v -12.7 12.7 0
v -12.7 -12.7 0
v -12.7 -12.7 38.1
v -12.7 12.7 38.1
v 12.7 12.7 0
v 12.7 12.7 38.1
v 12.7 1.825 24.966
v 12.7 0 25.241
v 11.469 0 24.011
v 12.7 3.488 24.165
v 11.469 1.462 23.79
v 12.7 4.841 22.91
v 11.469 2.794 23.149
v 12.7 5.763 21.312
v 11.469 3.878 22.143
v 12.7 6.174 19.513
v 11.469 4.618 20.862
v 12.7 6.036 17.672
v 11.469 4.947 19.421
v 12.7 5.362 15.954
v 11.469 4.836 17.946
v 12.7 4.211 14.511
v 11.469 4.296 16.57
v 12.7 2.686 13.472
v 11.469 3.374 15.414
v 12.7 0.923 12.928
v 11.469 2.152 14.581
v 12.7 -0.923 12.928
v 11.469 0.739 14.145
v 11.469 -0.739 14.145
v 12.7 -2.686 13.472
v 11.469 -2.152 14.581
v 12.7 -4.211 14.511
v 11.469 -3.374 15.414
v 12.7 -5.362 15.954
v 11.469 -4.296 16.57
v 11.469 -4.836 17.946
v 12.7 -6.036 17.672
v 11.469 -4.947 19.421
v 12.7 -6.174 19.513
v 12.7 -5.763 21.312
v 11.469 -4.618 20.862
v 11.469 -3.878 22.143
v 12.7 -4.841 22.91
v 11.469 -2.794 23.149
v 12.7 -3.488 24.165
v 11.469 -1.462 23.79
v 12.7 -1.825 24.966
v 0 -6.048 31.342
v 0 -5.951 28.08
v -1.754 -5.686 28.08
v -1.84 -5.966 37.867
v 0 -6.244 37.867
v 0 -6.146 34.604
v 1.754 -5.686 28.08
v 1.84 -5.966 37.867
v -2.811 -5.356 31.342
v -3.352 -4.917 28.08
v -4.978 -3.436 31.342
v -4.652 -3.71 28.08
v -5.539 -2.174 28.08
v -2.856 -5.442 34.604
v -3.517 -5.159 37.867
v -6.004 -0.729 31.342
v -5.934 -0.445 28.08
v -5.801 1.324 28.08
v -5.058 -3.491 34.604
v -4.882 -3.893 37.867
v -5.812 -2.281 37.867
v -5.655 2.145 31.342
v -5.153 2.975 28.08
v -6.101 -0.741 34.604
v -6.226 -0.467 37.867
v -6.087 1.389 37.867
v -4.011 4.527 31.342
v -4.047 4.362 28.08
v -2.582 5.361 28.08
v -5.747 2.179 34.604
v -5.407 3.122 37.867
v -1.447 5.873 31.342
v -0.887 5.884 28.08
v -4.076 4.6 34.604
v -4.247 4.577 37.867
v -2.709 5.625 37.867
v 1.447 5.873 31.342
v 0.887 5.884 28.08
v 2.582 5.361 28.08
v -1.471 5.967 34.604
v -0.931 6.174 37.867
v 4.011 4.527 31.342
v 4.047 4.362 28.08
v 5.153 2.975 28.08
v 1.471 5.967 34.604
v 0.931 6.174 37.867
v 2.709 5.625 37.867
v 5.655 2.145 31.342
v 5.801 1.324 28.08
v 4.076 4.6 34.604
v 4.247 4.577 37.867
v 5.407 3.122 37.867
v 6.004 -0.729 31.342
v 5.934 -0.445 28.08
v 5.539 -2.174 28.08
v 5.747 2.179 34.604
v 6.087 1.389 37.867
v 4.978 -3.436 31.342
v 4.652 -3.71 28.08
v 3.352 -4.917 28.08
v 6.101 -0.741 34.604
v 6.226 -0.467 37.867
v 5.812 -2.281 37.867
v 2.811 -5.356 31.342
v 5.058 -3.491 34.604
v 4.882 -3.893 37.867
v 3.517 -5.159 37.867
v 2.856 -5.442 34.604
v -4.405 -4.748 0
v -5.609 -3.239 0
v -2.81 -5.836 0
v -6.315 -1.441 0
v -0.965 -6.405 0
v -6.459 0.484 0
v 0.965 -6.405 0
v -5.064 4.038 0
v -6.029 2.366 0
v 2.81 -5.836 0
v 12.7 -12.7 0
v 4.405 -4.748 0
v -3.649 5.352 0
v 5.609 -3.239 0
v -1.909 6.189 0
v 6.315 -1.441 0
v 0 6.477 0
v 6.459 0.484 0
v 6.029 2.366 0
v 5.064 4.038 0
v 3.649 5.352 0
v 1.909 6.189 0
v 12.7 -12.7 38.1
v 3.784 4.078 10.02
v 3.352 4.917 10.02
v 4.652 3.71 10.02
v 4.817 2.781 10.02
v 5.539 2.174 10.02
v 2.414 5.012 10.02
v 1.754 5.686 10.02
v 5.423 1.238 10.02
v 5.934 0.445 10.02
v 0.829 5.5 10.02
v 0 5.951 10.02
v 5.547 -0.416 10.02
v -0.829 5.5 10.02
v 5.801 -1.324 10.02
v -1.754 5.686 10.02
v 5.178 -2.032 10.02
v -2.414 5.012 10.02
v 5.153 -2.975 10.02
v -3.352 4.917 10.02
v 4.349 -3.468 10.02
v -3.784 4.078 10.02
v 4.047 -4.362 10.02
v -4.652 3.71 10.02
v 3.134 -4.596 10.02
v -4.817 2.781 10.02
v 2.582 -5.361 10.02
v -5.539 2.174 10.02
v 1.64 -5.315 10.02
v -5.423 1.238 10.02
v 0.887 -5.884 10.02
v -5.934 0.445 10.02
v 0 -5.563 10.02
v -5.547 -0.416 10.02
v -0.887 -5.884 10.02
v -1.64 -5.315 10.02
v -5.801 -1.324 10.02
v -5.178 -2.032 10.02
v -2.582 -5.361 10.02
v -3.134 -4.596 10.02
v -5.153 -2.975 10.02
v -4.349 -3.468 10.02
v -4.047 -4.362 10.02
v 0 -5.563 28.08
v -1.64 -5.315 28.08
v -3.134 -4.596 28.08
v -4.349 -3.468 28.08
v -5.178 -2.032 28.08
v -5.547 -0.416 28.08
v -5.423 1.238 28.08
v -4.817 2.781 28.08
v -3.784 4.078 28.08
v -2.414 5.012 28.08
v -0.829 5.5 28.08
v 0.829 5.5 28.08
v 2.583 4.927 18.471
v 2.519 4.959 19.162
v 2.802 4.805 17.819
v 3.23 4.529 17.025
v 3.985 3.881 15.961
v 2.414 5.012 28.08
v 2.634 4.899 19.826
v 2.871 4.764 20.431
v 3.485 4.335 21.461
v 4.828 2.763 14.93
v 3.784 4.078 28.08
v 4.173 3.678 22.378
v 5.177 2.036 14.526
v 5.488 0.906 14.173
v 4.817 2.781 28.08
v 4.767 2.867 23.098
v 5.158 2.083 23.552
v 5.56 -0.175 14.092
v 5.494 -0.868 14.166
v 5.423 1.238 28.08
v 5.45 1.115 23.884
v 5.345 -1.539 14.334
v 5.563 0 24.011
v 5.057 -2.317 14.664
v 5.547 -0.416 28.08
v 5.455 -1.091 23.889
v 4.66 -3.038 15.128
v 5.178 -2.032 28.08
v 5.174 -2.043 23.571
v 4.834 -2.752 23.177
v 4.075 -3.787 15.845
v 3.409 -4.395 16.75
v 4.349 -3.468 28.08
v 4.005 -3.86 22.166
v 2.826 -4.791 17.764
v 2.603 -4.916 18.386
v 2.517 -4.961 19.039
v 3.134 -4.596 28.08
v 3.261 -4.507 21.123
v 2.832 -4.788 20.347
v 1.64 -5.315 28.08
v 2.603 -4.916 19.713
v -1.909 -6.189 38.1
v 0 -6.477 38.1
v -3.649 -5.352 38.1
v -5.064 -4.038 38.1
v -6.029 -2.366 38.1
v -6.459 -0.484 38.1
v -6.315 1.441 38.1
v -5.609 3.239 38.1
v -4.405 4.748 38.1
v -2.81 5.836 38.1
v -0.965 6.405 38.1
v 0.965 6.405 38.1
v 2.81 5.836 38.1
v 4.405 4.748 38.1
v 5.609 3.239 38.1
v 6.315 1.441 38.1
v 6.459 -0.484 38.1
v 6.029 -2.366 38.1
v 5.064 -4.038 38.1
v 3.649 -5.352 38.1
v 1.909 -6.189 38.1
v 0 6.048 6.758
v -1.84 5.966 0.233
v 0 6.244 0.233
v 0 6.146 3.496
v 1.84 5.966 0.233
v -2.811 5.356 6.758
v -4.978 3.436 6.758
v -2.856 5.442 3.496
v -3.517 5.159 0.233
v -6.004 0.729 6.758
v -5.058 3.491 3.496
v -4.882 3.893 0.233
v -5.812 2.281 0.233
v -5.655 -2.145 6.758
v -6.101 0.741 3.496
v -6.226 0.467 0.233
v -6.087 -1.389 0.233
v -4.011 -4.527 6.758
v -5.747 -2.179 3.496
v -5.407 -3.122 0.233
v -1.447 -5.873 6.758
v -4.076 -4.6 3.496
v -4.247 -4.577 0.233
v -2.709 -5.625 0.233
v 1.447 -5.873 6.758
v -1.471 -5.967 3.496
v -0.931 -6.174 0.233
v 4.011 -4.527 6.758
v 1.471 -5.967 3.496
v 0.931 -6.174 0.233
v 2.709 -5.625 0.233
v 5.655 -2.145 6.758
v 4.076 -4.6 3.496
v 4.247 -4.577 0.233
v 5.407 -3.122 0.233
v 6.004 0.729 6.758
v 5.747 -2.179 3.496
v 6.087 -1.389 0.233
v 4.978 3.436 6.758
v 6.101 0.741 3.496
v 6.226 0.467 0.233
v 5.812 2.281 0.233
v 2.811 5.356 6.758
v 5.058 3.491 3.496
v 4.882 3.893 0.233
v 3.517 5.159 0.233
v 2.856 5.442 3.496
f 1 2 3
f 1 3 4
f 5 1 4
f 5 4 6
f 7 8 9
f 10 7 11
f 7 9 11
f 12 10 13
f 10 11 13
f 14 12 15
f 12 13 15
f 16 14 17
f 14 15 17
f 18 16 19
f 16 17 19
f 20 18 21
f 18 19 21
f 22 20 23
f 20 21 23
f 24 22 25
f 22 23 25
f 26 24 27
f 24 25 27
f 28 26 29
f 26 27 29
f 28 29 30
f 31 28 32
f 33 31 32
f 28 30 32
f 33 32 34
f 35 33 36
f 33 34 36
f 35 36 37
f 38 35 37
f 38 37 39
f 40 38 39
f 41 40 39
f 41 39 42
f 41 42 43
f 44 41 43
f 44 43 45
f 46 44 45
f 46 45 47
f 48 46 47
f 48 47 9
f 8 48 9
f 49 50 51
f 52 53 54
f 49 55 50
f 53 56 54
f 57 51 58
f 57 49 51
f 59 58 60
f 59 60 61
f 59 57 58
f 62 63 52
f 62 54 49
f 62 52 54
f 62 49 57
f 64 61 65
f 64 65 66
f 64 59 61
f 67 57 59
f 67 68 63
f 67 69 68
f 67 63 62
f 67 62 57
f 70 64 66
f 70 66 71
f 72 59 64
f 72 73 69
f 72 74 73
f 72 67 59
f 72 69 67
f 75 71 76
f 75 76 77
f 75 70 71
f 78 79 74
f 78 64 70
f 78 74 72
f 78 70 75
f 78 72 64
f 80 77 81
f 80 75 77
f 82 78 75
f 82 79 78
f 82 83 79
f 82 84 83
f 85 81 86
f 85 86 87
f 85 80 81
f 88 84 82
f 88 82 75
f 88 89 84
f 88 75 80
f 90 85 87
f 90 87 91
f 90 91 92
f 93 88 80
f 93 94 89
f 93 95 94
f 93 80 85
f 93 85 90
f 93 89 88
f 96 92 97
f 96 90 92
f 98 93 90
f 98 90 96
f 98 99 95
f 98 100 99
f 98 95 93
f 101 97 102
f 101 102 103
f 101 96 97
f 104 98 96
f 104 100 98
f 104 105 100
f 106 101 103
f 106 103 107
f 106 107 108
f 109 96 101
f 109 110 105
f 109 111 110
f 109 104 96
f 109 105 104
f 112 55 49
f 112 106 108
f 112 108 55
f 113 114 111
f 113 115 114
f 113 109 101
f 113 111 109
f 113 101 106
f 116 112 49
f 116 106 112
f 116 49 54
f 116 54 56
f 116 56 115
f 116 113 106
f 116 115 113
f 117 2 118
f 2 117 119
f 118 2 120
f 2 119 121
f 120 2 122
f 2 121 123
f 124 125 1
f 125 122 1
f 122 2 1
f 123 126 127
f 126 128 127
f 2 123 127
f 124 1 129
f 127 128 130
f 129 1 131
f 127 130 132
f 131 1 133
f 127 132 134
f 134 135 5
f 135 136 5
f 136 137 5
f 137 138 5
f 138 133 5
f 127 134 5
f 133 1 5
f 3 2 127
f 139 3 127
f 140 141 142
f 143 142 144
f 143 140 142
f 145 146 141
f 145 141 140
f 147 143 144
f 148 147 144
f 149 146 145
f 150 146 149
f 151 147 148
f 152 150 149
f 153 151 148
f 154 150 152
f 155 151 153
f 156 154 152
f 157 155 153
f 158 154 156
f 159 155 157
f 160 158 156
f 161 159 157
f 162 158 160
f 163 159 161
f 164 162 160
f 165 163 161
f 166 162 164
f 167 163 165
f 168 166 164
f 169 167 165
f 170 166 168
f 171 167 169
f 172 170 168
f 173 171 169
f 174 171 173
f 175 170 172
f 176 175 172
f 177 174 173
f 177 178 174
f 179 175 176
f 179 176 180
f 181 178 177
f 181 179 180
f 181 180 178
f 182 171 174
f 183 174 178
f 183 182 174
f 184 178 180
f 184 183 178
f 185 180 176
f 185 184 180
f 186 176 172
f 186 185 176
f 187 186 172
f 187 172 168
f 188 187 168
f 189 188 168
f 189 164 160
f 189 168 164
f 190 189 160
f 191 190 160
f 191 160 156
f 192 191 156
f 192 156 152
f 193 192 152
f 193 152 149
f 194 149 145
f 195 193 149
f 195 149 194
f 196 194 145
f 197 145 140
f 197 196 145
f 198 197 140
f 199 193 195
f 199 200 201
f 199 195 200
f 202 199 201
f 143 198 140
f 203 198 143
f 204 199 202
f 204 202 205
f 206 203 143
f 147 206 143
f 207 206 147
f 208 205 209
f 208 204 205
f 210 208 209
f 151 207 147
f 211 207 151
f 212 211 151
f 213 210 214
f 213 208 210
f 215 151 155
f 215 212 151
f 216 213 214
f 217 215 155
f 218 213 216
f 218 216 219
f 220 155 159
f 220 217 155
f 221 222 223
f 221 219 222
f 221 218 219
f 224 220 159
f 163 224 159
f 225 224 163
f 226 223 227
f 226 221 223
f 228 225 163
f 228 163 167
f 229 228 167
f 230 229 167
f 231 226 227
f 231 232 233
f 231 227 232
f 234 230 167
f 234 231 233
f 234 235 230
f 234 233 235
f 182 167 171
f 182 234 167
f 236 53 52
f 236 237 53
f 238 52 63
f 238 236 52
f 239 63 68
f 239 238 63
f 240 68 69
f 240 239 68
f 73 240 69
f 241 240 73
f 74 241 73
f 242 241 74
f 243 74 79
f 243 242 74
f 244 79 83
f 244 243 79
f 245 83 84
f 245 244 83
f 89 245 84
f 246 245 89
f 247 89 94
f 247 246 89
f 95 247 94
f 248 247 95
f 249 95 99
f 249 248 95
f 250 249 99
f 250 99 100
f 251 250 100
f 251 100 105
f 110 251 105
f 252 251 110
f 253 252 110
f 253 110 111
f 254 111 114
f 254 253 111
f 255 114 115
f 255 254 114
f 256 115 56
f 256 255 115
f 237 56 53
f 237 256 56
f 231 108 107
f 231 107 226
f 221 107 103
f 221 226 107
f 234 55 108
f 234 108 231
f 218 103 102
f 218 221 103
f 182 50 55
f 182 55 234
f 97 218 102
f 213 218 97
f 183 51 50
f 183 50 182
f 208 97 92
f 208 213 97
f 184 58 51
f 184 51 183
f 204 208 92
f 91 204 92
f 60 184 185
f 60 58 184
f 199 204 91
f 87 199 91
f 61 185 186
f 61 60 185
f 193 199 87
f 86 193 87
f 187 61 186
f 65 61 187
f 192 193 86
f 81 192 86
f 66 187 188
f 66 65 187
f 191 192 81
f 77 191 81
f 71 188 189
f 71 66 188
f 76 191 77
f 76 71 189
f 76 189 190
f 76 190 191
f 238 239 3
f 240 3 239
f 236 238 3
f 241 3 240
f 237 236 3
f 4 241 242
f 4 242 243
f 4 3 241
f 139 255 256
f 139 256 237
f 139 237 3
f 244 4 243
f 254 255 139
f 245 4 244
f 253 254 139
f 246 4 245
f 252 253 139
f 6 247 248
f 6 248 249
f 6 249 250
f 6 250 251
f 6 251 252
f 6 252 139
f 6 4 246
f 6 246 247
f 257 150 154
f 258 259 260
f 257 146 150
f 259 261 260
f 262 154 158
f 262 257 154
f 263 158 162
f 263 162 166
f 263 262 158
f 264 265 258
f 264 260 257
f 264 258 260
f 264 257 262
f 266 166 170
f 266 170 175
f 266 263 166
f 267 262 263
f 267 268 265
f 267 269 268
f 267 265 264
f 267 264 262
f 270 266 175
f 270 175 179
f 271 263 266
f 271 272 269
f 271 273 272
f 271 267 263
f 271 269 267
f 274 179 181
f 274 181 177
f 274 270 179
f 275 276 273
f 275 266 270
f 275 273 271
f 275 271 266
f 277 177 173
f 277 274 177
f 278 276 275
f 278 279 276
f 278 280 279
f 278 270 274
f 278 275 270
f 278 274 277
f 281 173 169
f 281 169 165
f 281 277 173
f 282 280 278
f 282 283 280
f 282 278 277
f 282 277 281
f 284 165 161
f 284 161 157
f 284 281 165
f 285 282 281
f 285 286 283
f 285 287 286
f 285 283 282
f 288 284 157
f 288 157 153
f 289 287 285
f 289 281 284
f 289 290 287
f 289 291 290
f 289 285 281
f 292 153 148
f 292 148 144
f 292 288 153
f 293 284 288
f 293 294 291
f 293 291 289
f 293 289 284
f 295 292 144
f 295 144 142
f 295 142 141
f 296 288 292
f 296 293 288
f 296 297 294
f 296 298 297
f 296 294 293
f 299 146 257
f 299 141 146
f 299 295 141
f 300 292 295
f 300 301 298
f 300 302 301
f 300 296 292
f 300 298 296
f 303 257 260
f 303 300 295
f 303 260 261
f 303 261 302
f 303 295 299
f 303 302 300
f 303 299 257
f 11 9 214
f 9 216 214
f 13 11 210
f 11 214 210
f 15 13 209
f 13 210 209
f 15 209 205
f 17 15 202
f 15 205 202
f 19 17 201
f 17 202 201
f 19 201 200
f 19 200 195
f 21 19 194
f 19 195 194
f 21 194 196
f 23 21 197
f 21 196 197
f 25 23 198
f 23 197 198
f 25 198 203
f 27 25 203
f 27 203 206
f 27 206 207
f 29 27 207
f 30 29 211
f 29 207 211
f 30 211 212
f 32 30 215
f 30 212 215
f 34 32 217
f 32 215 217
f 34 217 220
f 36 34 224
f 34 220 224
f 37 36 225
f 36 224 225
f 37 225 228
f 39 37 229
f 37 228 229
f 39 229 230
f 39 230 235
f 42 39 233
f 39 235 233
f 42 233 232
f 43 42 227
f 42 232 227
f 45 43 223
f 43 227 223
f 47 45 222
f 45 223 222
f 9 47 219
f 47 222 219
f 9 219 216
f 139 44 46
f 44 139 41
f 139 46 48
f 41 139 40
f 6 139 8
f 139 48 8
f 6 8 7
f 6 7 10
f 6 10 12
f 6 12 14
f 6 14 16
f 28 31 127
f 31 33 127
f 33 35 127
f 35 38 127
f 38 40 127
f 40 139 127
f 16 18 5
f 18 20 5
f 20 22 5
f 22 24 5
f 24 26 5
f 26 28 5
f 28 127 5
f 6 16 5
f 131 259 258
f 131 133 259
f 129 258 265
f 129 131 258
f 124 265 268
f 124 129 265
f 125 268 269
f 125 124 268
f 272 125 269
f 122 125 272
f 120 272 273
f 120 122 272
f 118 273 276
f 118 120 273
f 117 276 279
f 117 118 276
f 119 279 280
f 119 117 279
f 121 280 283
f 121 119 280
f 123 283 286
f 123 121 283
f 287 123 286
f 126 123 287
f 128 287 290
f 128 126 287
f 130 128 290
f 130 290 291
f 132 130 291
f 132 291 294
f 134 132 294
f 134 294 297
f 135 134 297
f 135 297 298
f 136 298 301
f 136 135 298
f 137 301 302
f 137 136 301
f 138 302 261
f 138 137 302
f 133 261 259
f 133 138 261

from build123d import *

# Parameters (mm, degrees)
SKETCH2_W                          = 25.4
SKETCH2_H                          = 25.4
BOSS_EXTRUDE1_DEPTH                = 38.1
F_7_16_20_TAPPED_HOLE2_D           = 9.92124
F_7_16_20_TAPPED_HOLE2_DEPTH       = 12.7
F_7_16_20_TAPPED_HOLE2_CSINK_D     = 12.3825
F_7_16_20_TAPPED_HOLE2_CSINK_ANGLE = 90
F_7_16_20_TAPPED_HOLE2_TIP         = 2.980641204


with BuildPart() as part:
    # Sketch2 → Boss-Extrude1 (new body)
    with BuildSketch(Plane.XY):
        Rectangle(SKETCH2_W, SKETCH2_H)
    extrude(amount=BOSS_EXTRUDE1_DEPTH)

    # Sketch6 → 1/4 NPT Tapped Hole1 (revolve, cut)
    with BuildSketch(Plane(origin=(0, 0, 38.1), x_dir=(0, -1, 0), z_dir=(1, 0, 0))):
        Polygon((0, 0), (0, 38.1), (5.5626, 38.1), (5.5626, 10.02), (5.950661746, 10.02), (6.2436883, 0.2333117), (6.477, 0), align=None)
    revolve(axis=Axis((0, 0, 44.45), (0, 0, -1)), mode=Mode.SUBTRACT)

    # Sketch8 → 1/4 NPT Tapped Hole2 (revolve, cut)
    with BuildSketch(Plane.YZ):
        Polygon((0, 0), (0, 38.1), (5.5626, 38.1), (5.5626, 10.02), (5.950661746, 10.02), (6.2436883, 0.2333117), (6.477, 0), align=None)
    revolve(axis=Axis((0, 0, -6.35), (0, 0, 1)), mode=Mode.SUBTRACT)

    # 7/16-20 Tapped Hole2
    with Locations(Plane(origin=(12.7, 0, 0), x_dir=(0, 0, -1), z_dir=(1, 0, 0))):
        with Locations((-19.05, 0)):
            CounterSinkHole(F_7_16_20_TAPPED_HOLE2_D / 2, F_7_16_20_TAPPED_HOLE2_CSINK_D / 2, depth=F_7_16_20_TAPPED_HOLE2_DEPTH, counter_sink_angle=F_7_16_20_TAPPED_HOLE2_CSINK_ANGLE)
            with Locations((0, 0, -(F_7_16_20_TAPPED_HOLE2_DEPTH + F_7_16_20_TAPPED_HOLE2_TIP / 2))):  # 118° drill point
                Cone(0, F_7_16_20_TAPPED_HOLE2_D / 2, F_7_16_20_TAPPED_HOLE2_TIP, mode=Mode.SUBTRACT)


solid = part.part
